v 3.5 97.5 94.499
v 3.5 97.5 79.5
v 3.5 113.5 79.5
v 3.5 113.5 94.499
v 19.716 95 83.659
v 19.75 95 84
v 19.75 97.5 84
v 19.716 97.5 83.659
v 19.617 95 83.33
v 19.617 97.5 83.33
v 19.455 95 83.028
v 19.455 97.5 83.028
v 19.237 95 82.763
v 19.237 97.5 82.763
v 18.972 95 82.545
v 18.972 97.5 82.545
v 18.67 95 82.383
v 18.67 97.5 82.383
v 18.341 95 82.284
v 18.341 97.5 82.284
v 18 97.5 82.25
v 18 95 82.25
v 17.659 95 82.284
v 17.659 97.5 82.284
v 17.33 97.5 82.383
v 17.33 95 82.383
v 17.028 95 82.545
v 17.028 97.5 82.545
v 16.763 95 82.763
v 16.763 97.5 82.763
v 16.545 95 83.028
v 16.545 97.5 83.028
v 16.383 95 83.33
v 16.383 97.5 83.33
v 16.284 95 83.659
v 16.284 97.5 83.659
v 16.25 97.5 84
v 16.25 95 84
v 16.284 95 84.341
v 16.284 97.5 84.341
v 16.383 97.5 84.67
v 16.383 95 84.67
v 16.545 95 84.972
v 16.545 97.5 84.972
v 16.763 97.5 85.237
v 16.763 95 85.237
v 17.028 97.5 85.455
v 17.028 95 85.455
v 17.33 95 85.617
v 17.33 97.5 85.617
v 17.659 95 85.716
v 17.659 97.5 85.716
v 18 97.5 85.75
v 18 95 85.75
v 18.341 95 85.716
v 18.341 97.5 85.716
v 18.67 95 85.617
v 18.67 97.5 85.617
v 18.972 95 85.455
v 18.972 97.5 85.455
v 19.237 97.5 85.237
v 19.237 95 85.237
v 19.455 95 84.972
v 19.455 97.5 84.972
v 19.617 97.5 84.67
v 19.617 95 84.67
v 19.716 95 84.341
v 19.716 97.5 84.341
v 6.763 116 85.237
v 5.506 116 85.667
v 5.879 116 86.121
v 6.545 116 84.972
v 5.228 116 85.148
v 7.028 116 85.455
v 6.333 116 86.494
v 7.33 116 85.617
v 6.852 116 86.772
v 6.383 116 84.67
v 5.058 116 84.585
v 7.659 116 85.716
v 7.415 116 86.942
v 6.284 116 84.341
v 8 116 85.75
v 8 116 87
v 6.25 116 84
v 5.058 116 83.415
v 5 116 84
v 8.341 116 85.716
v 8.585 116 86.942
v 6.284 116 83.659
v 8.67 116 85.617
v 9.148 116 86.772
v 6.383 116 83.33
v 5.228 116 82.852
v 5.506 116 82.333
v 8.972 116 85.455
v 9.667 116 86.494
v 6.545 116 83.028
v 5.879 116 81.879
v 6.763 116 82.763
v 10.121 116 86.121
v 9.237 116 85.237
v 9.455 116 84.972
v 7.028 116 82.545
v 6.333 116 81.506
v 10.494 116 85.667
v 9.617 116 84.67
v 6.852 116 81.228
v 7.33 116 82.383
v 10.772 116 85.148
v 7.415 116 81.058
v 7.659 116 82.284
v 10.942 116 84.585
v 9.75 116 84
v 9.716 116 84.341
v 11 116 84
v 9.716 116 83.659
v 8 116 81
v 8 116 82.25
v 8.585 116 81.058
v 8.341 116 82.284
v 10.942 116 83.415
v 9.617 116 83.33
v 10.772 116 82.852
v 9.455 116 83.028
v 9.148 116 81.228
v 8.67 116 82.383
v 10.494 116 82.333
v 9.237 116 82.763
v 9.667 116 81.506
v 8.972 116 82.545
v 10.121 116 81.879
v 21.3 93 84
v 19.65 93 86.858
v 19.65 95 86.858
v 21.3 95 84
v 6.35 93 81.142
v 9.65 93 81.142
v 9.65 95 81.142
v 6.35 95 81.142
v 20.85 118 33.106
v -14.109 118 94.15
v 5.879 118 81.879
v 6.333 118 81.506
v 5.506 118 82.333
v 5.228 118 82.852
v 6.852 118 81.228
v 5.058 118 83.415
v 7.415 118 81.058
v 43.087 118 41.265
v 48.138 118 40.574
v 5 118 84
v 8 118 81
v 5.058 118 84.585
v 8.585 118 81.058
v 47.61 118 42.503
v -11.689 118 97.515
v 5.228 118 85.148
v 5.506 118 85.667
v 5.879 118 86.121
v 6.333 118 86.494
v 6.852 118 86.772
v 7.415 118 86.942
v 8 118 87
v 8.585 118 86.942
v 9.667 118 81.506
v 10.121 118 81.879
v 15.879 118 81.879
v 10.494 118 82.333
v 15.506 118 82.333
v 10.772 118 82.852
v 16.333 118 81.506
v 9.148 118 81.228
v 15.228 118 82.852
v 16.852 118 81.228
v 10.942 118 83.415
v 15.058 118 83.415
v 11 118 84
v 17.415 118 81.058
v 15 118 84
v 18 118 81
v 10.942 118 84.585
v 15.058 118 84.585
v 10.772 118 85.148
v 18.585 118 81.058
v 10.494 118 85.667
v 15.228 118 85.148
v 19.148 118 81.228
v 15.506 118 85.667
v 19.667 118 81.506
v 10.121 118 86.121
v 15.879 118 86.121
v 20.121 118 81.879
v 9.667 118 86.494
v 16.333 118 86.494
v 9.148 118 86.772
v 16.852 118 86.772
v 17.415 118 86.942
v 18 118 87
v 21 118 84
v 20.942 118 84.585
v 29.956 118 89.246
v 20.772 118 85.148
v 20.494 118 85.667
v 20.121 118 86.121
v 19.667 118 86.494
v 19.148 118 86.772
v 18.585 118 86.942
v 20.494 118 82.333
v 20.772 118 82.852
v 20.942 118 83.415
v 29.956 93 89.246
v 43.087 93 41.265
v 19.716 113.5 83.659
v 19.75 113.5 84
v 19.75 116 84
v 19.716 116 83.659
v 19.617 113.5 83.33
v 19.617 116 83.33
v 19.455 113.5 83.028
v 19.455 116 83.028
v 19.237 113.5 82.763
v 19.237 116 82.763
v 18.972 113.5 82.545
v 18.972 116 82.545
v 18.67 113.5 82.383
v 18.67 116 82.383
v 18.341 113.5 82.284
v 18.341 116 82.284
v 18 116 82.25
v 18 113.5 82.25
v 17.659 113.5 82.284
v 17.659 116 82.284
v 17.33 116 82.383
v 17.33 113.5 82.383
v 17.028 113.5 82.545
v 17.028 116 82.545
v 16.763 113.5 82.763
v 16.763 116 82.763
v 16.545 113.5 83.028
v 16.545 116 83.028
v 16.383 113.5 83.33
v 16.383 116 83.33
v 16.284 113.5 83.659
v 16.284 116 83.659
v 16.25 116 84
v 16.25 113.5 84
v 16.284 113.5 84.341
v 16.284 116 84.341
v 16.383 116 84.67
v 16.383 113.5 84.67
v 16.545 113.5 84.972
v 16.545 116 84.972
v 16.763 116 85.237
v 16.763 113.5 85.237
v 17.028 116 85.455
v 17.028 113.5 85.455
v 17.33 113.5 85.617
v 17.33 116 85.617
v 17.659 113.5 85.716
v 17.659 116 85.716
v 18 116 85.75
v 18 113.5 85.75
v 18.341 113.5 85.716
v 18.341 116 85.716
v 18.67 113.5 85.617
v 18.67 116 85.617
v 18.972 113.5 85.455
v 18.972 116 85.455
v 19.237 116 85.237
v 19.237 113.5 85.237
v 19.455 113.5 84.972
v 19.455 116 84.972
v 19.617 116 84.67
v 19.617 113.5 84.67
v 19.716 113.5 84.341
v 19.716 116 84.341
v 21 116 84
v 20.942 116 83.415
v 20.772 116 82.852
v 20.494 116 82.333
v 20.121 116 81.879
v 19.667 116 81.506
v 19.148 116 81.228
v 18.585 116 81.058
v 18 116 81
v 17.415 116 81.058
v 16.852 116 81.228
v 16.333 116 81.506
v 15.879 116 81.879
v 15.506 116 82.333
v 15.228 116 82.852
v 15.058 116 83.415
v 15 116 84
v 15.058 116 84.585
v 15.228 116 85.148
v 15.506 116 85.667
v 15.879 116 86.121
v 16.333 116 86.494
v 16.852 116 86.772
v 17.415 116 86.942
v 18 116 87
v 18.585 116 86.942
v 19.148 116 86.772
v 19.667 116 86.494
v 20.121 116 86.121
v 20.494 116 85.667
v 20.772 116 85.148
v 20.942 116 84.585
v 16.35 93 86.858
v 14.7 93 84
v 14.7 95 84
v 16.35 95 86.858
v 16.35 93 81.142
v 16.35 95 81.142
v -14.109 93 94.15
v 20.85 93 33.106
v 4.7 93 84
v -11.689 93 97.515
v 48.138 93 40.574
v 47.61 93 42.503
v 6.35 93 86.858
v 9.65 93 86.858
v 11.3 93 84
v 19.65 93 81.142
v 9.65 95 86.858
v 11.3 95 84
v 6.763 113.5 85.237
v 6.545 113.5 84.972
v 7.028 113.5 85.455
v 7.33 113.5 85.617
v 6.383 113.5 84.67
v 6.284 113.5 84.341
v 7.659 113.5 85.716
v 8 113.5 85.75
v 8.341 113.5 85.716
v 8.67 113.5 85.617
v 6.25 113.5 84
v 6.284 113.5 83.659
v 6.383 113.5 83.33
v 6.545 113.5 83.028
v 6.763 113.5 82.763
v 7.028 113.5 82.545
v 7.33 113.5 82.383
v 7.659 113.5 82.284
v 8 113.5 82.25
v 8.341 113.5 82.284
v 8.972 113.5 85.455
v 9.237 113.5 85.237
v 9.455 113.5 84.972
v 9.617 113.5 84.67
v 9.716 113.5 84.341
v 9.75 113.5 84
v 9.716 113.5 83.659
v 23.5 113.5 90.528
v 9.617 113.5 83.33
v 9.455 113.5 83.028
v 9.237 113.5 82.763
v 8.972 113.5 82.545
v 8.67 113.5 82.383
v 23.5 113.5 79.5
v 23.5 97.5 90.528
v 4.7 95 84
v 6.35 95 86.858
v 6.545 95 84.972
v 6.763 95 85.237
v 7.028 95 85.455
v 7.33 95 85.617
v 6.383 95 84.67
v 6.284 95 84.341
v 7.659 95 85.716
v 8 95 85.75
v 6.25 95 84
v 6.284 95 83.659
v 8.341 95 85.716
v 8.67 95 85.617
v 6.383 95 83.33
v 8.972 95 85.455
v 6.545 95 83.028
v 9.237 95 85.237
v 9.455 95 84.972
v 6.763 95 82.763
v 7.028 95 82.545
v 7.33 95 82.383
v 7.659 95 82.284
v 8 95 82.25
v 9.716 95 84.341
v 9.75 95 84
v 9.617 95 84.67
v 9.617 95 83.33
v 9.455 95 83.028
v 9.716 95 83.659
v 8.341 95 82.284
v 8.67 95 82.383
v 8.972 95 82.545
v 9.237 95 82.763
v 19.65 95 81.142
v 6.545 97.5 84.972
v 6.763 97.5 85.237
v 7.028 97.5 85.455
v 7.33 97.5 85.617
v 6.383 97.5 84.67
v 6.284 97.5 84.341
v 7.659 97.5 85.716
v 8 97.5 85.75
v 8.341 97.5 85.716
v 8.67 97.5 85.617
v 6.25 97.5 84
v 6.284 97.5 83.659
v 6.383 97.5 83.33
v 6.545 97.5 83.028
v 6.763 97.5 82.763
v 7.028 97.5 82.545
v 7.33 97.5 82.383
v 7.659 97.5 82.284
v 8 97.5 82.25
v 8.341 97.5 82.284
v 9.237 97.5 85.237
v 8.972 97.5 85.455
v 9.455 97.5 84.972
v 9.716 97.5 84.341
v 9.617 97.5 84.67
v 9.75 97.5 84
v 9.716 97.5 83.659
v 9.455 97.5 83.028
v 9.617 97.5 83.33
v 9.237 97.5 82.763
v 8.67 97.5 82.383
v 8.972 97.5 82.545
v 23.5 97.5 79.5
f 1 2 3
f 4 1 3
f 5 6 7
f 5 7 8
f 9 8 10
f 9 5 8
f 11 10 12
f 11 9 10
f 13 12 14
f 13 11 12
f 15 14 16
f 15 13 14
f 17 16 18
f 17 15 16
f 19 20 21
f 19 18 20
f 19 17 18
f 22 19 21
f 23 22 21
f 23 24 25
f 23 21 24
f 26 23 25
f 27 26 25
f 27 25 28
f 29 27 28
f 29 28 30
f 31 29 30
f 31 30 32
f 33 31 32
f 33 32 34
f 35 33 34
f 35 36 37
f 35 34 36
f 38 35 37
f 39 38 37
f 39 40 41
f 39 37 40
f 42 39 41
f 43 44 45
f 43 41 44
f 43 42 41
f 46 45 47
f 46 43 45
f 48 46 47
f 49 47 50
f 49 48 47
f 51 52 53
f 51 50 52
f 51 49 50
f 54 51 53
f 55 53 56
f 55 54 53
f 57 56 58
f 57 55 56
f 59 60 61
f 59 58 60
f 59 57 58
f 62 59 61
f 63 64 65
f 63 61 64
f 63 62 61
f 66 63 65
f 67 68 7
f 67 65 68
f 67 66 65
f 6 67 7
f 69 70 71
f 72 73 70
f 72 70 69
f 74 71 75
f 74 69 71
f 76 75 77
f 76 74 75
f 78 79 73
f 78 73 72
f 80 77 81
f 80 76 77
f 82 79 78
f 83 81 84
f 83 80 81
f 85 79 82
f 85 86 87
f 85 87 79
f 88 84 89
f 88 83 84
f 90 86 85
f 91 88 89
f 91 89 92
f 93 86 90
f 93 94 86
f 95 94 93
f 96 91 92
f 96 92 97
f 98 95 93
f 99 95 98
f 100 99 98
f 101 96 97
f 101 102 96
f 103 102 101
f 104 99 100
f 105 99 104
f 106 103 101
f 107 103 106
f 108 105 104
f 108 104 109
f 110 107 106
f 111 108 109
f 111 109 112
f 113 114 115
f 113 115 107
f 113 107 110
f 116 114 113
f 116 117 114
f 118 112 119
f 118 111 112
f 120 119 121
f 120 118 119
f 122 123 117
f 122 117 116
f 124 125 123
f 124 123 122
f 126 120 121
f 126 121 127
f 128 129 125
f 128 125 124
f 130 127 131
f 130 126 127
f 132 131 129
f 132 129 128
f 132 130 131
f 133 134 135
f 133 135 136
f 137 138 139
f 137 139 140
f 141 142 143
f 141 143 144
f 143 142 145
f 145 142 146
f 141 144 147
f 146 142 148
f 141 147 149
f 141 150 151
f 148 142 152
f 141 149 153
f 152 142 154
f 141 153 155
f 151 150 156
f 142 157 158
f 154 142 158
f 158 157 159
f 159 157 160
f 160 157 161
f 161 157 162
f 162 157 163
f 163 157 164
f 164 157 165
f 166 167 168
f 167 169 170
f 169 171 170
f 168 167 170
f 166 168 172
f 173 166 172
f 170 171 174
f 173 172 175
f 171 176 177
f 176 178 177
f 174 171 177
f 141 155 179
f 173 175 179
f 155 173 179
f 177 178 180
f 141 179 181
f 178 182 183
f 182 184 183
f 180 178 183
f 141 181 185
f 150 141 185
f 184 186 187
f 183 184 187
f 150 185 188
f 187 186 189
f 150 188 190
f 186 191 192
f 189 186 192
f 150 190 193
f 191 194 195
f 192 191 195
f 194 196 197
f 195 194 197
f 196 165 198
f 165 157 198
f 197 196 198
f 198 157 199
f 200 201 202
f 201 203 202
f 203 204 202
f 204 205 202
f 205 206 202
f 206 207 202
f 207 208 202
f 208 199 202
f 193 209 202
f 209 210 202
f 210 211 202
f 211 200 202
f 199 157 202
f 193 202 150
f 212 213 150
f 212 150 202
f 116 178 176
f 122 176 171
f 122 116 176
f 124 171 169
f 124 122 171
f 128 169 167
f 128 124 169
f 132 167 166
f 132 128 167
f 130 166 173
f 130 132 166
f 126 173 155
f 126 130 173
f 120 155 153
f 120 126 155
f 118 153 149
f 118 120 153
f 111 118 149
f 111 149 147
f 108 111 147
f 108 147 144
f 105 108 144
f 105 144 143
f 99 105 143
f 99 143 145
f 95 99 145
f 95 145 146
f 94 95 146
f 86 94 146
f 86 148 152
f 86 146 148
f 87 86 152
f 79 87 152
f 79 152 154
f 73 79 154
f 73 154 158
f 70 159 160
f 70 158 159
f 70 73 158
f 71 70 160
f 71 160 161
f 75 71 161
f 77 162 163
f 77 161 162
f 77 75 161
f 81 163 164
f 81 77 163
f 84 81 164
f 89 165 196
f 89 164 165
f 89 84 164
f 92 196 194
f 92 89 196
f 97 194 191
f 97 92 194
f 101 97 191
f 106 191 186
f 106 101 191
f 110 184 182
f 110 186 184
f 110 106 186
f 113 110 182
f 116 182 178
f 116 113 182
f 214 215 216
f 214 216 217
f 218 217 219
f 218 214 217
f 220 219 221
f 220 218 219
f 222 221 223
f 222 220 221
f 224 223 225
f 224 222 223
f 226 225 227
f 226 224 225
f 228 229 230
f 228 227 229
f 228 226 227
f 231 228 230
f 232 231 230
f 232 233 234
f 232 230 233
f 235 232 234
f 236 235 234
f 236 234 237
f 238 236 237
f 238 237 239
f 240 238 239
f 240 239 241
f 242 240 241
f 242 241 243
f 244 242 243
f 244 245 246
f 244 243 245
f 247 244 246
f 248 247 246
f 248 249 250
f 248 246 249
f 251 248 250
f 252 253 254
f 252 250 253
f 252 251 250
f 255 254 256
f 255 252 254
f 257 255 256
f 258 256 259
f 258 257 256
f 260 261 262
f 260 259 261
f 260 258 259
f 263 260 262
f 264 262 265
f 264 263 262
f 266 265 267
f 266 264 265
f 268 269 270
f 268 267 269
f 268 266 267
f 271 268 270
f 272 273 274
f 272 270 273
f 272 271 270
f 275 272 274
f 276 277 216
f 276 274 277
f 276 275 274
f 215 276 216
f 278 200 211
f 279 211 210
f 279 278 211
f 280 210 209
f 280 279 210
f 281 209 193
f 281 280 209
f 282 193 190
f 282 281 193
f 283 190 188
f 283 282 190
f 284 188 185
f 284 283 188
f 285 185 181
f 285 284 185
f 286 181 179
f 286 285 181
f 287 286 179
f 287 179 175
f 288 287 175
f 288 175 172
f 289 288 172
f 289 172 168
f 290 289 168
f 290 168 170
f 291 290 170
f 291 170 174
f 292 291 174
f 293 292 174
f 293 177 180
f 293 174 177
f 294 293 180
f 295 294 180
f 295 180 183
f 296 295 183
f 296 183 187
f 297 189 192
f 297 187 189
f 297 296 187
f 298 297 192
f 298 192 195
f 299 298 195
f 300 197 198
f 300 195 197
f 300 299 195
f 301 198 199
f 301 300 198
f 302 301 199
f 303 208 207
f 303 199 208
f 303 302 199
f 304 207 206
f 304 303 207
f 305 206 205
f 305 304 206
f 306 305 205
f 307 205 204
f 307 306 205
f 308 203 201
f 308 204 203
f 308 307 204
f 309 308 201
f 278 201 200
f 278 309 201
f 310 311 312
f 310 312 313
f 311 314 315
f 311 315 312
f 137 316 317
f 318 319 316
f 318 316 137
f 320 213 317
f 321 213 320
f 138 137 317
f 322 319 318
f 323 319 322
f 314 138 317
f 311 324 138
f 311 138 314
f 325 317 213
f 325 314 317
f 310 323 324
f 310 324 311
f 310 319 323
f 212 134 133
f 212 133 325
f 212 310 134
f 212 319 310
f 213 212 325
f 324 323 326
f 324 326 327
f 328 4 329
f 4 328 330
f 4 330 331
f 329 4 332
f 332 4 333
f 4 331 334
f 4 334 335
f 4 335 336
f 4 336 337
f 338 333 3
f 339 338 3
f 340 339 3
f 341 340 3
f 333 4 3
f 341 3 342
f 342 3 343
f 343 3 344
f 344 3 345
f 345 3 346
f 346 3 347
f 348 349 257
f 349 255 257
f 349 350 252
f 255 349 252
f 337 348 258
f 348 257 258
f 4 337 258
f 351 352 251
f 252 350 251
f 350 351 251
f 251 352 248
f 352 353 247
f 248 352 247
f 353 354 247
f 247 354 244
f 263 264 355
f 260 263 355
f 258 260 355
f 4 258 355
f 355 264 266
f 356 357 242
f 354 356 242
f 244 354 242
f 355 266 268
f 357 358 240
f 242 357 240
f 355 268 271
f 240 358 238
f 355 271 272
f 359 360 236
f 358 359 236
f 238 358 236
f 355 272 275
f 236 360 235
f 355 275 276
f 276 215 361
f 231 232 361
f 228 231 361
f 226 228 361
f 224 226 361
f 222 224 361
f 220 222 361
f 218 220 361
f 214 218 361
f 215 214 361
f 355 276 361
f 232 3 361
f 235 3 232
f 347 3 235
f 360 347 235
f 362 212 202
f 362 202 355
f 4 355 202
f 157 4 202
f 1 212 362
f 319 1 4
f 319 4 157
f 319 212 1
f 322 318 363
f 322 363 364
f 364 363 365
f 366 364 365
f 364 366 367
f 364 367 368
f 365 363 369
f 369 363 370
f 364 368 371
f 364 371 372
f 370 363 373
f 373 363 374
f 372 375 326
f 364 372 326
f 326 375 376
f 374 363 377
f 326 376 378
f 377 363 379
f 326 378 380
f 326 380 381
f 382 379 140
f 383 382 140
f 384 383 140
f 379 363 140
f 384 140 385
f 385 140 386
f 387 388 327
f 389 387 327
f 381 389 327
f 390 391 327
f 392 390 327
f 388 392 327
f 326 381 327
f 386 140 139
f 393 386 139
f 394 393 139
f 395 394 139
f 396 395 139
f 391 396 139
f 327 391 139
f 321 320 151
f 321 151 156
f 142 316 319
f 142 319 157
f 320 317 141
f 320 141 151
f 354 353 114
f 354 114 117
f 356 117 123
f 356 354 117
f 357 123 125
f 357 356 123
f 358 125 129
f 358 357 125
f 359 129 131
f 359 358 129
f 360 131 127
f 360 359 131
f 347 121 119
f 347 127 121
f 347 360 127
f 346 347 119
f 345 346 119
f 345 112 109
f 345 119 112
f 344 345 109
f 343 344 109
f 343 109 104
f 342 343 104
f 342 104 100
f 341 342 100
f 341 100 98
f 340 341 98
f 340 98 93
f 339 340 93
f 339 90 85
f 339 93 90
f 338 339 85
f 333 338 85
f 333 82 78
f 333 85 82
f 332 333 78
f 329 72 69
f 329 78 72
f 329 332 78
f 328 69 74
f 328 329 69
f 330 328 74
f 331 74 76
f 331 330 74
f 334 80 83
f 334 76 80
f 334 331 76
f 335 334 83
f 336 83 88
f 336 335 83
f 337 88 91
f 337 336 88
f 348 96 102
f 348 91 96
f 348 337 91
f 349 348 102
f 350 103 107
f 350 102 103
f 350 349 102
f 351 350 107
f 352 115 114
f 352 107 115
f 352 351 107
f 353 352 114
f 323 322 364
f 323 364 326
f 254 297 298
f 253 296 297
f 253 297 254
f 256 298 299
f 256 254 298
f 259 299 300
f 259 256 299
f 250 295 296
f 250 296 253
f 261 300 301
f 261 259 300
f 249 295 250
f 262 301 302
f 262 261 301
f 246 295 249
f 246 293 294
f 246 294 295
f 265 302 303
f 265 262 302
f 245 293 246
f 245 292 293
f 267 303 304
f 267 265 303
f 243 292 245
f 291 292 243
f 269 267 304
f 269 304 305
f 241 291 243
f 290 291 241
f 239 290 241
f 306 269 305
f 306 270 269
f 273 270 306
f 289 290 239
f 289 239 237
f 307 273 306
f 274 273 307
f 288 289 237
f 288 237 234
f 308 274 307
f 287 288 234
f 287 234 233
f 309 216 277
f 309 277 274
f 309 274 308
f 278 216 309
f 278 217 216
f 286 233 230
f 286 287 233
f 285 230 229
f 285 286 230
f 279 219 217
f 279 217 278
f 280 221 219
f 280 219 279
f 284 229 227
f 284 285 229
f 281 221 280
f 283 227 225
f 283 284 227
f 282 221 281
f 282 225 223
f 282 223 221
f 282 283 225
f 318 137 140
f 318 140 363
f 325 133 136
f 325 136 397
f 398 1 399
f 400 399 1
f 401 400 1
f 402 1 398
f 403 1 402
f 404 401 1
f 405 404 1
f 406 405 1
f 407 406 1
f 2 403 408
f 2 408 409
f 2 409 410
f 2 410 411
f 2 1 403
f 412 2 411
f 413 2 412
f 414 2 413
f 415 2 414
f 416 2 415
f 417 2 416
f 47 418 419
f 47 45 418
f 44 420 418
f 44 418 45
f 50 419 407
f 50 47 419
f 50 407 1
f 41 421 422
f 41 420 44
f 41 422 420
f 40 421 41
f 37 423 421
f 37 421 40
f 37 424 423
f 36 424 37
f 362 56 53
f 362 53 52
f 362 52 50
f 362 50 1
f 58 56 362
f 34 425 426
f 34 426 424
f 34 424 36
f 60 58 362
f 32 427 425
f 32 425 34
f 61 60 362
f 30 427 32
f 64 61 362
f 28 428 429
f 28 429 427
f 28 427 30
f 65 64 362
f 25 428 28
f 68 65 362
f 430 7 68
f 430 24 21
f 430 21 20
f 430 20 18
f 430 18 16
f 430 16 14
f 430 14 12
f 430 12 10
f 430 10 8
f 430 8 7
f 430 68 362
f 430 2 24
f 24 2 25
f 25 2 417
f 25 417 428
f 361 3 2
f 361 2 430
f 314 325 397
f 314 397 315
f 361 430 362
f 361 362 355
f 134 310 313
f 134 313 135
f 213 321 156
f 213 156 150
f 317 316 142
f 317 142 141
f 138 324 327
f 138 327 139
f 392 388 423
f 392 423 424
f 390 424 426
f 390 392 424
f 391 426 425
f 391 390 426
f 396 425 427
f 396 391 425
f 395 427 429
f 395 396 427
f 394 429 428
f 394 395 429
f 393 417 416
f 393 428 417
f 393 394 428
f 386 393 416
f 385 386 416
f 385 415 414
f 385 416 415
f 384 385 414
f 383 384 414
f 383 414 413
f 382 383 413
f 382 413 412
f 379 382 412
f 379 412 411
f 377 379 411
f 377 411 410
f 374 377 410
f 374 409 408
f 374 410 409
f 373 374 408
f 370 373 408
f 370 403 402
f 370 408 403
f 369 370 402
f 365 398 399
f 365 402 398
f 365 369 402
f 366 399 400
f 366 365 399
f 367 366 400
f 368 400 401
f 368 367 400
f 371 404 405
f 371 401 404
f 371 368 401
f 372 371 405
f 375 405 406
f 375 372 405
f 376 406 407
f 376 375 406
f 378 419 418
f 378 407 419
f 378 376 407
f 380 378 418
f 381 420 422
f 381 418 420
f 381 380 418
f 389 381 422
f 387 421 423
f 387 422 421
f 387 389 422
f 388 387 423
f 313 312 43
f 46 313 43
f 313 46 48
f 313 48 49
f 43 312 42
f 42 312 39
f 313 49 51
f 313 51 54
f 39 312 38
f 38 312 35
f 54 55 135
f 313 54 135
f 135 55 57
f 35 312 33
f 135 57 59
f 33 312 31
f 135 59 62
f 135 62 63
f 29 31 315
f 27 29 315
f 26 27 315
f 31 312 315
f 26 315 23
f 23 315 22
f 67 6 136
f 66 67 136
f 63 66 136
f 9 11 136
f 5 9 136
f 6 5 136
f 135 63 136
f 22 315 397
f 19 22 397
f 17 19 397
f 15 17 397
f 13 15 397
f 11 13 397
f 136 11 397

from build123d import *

# Parameters (mm, degrees)
CYLINDER077_R          = 3
CYLINDER077_DEPTH      = 32
CYLINDER077_ROLL_ANGLE = -90
CYLINDER076_R          = 3
CYLINDER076_DEPTH      = 32
CYLINDER076_ROLL_ANGLE = -90
PRISM002_DEPTH         = 10
PRISM002_ROLL_ANGLE    = -90
PRISM003_DEPTH         = 10
PRISM003_ROLL_ANGLE    = -90
CYLINDER071_R          = 1.75
CYLINDER071_DEPTH      = 32
CYLINDER071_ROLL_ANGLE = -90
CYLINDER072_R          = 1.75
CYLINDER072_DEPTH      = 32
CYLINDER072_ROLL_ANGLE = -90
BOX055_W               = 20
BOX055_H               = 16
BOX055_DEPTH           = 56
PAD009_DEPTH           = 25
CHAMFER109_SIZE        = 5


with BuildPart() as cilindro018:
    # Cylinder077 → Cylinder077 (new body)
    with BuildSketch(Plane.XY):
        Circle(CYLINDER077_R)
    extrude(amount=CYLINDER077_DEPTH)


with BuildPart() as cilindro018_1:
    # Cylinder077 roll: moved
    add(cilindro018.part.rotate(Axis((0, 0, 0), (1, 0, 0)), CYLINDER077_ROLL_ANGLE))


with BuildPart() as cilindro018_2:
    # Cylinder077 placement: moved
    add(cilindro018_1.part.moved(Location((8, 116, 84))))


with BuildPart() as fusion059:
    # Cylinder076 → Cylinder076 (new body)
    with BuildSketch(Plane.XY):
        Circle(CYLINDER076_R)
    extrude(amount=CYLINDER076_DEPTH)


with BuildPart() as fusion059_1:
    # Cylinder076 roll: moved
    add(fusion059.part.rotate(Axis((0, 0, 0), (1, 0, 0)), CYLINDER076_ROLL_ANGLE))


with BuildPart() as fusion059_2:
    # Cylinder076 placement: moved
    add(fusion059_1.part.moved(Location((18, 116, 84))))

    # Fusion059: union Cilindro018
    add(cilindro018_2.part)


with BuildPart() as prisma001:
    # Prism002 → Prism002 (new body)
    with BuildSketch(Plane.XY):
        Polygon((3.3, 0), (1.65, 2.857884), (-1.65, 2.857884), (-3.3, 0), (-1.65, -2.857884), (1.65, -2.857884), align=None)
    extrude(amount=PRISM002_DEPTH)


with BuildPart() as prisma001_1:
    # Prism002 roll: moved
    add(prisma001.part.rotate(Axis((0, 0, 0), (1, 0, 0)), PRISM002_ROLL_ANGLE))


with BuildPart() as prisma001_2:
    # Prism002 placement: moved
    add(prisma001_1.part.moved(Location((18, 85, 84))))


with BuildPart() as fusion058:
    # Prism003 → Prism003 (new body)
    with BuildSketch(Plane.XY):
        Polygon((3.3, 0), (1.65, 2.857884), (-1.65, 2.857884), (-3.3, 0), (-1.65, -2.857884), (1.65, -2.857884), align=None)
    extrude(amount=PRISM003_DEPTH)


with BuildPart() as fusion058_1:
    # Prism003 roll: moved
    add(fusion058.part.rotate(Axis((0, 0, 0), (1, 0, 0)), PRISM003_ROLL_ANGLE))


with BuildPart() as fusion058_2:
    # Prism003 placement: moved
    add(fusion058_1.part.moved(Location((8, 85, 84))))

    # Fusion058: union Prisma001
    add(prisma001_2.part)


with BuildPart() as cilindro012:
    # Cylinder071 → Cylinder071 (new body)
    with BuildSketch(Plane.XY):
        Circle(CYLINDER071_R)
    extrude(amount=CYLINDER071_DEPTH)


with BuildPart() as cilindro012_1:
    # Cylinder071 roll: moved
    add(cilindro012.part.rotate(Axis((0, 0, 0), (1, 0, 0)), CYLINDER071_ROLL_ANGLE))


with BuildPart() as cilindro012_2:
    # Cylinder071 placement: moved
    add(cilindro012_1.part.moved(Location((8, 90, 84))))


with BuildPart() as fusion055:
    # Cylinder072 → Cylinder072 (new body)
    with BuildSketch(Plane.XY):
        Circle(CYLINDER072_R)
    extrude(amount=CYLINDER072_DEPTH)


with BuildPart() as fusion055_1:
    # Cylinder072 roll: moved
    add(fusion055.part.rotate(Axis((0, 0, 0), (1, 0, 0)), CYLINDER072_ROLL_ANGLE))


with BuildPart() as fusion055_2:
    # Cylinder072 placement: moved
    add(fusion055_1.part.moved(Location((18, 90, 84))))

    # Fusion055: union Cilindro012
    add(cilindro012_2.part)


with BuildPart() as cubo005:
    # Box055 → Box055 (new body)
    with BuildSketch(Plane(origin=(3.5, 97.5, 79.5), x_dir=(1, 0, 0), z_dir=(0, 0, 1))):
        with Locations((10, 8)):
            Rectangle(BOX055_W, BOX055_H)
    extrude(amount=BOX055_DEPTH)


with BuildPart() as hand_src:
    # Sketch014 → Pad009 (new body)
    with BuildSketch(Plane(origin=(0, 93, 0), x_dir=(-1, 0, 0), z_dir=(0, 1, 0))):
        Polygon((-43.087208, 41.265208), (-29.956285, 89.24578), (16.5937, 98.48838), (-20.850395, 33.106079), (-48.138032, 40.573932), (-47.610101, 42.502996), align=None)
    extrude(amount=PAD009_DEPTH)

    # Cut096: cut Cubo005
    add(cubo005.part, mode=Mode.SUBTRACT)

    # Cut097: cut Fusion055
    add(fusion055_2.part, mode=Mode.SUBTRACT)

    # Cut101: cut Fusion058
    add(fusion058_2.part, mode=Mode.SUBTRACT)

    # Cut102: cut Fusion059
    add(fusion059_2.part, mode=Mode.SUBTRACT)

    # Chamfer109
    chamfer109_edges = [hand_src.edges().sort_by_distance(p)[0] for p in [
        (-16.5937, 105.5, 98.48838),
    ]]
    chamfer(chamfer109_edges, length=CHAMFER109_SIZE)


solid = hand_src.part
